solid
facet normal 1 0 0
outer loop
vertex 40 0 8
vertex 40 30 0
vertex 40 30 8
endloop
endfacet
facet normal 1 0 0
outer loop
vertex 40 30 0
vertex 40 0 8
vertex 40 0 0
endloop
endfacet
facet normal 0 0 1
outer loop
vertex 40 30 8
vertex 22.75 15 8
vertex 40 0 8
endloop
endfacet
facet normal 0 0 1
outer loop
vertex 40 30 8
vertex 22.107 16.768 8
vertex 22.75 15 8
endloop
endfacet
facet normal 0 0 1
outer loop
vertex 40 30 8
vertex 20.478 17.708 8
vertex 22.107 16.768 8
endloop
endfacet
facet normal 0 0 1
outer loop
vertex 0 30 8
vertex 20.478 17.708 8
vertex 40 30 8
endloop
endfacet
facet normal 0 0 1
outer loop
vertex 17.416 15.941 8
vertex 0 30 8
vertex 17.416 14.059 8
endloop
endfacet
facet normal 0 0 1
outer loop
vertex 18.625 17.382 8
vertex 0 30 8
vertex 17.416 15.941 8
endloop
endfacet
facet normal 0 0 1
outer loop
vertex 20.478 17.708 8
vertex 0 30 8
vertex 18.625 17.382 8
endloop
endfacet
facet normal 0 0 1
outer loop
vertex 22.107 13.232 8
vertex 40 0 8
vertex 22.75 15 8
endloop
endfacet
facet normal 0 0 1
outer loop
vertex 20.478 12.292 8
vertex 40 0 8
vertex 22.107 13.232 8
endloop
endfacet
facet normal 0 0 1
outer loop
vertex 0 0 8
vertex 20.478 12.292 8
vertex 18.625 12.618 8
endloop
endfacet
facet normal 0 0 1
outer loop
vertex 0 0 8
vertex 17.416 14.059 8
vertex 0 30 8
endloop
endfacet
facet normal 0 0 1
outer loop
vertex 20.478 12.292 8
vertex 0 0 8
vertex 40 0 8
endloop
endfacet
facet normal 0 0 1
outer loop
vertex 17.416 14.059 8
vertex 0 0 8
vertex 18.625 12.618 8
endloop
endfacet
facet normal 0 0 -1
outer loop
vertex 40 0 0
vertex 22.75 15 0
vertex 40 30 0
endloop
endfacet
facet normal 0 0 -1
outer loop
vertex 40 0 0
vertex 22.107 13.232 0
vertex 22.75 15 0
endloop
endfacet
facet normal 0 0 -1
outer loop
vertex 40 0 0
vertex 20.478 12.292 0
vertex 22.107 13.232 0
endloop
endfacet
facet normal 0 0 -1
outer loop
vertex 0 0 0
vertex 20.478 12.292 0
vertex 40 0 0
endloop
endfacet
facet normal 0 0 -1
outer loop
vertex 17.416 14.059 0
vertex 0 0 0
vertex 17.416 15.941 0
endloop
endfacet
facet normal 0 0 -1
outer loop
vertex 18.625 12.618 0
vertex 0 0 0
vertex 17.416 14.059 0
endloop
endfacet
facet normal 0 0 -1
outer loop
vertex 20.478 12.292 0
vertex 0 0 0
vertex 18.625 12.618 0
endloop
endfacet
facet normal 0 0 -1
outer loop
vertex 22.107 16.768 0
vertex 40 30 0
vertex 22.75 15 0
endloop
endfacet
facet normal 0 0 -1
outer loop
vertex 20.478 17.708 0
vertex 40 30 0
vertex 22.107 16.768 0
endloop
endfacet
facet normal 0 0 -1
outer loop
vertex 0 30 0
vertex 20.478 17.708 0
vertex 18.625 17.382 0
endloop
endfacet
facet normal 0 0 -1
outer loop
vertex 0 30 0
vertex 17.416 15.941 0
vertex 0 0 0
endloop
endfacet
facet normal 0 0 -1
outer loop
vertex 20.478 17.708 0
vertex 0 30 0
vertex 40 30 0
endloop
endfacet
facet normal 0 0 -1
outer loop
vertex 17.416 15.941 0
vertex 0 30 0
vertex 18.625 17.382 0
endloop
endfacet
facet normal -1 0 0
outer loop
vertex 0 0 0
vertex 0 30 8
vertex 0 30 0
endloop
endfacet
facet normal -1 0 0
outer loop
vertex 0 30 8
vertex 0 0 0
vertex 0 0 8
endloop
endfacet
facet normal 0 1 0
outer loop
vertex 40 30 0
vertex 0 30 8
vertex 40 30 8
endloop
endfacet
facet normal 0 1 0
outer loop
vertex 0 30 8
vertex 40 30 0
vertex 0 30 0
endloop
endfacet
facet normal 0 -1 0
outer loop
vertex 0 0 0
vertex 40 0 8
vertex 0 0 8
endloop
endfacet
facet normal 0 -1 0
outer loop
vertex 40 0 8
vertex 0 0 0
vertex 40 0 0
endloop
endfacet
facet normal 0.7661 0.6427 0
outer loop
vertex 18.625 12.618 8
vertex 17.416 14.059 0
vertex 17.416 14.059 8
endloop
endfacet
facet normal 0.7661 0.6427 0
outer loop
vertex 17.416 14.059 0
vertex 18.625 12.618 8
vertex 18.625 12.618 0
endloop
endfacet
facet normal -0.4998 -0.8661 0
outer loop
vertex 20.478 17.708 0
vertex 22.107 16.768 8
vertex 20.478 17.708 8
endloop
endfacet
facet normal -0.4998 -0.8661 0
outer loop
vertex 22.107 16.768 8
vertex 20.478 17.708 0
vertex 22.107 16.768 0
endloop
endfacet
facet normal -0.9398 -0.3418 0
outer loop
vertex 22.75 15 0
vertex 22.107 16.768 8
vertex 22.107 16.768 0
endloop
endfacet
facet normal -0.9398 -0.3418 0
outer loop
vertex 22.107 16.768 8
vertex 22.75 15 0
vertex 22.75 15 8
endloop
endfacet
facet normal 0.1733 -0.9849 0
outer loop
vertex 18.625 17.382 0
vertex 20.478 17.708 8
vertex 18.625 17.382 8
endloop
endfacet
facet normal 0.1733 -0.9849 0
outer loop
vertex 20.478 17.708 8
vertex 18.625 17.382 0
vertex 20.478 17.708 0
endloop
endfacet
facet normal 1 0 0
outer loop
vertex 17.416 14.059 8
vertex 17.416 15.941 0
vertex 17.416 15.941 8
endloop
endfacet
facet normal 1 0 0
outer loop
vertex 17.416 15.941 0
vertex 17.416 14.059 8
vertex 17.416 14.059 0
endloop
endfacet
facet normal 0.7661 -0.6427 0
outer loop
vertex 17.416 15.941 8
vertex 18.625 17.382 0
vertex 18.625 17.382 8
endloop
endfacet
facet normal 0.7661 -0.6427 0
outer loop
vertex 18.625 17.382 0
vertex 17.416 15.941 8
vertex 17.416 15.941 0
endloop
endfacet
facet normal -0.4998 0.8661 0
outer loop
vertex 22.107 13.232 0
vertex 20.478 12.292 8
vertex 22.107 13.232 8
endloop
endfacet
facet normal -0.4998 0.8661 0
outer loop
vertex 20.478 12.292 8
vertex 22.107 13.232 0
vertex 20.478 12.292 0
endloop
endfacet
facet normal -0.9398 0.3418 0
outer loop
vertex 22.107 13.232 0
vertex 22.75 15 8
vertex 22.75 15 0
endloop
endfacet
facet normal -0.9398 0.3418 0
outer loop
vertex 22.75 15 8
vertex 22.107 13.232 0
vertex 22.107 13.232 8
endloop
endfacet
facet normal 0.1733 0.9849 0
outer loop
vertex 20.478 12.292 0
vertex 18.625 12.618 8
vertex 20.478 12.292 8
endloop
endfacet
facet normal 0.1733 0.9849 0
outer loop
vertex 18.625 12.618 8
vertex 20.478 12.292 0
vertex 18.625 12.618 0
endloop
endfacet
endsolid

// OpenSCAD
// file: ../lib/hardware.scad
//placeholder stuff
function bolt_clearance(hw) =
    hw == "M4" ? 4.5 :
    hw == "M5" ? 5.5 :
    hw == "M6" ? 6.6 : undef;

function nut_flat(hw) =
    hw == "M4" ? 7.0 :
    hw == "M5" ? 8.0 :
    hw == "M6" ? 10.0 : undef;
// file: ../config.scad
//placeholder stuff
grid = 10;
hardware = "M5";
extrusion = "2020";
clearance_loose = 0.35;
clearance_tight = 0.15;
wall = 4;
// main file
//placeholder stuff
include <../config.scad>
use <../lib/hardware.scad>

module foot() {
    hole_d = bolt_clearance(hardware);
    difference() {
        cube([grid*4, grid*3, wall*2]);
        translate([grid*2, grid*1.5, -1])
            cylinder(h=wall*2+2, d=hole_d);
    }
}

foot();
